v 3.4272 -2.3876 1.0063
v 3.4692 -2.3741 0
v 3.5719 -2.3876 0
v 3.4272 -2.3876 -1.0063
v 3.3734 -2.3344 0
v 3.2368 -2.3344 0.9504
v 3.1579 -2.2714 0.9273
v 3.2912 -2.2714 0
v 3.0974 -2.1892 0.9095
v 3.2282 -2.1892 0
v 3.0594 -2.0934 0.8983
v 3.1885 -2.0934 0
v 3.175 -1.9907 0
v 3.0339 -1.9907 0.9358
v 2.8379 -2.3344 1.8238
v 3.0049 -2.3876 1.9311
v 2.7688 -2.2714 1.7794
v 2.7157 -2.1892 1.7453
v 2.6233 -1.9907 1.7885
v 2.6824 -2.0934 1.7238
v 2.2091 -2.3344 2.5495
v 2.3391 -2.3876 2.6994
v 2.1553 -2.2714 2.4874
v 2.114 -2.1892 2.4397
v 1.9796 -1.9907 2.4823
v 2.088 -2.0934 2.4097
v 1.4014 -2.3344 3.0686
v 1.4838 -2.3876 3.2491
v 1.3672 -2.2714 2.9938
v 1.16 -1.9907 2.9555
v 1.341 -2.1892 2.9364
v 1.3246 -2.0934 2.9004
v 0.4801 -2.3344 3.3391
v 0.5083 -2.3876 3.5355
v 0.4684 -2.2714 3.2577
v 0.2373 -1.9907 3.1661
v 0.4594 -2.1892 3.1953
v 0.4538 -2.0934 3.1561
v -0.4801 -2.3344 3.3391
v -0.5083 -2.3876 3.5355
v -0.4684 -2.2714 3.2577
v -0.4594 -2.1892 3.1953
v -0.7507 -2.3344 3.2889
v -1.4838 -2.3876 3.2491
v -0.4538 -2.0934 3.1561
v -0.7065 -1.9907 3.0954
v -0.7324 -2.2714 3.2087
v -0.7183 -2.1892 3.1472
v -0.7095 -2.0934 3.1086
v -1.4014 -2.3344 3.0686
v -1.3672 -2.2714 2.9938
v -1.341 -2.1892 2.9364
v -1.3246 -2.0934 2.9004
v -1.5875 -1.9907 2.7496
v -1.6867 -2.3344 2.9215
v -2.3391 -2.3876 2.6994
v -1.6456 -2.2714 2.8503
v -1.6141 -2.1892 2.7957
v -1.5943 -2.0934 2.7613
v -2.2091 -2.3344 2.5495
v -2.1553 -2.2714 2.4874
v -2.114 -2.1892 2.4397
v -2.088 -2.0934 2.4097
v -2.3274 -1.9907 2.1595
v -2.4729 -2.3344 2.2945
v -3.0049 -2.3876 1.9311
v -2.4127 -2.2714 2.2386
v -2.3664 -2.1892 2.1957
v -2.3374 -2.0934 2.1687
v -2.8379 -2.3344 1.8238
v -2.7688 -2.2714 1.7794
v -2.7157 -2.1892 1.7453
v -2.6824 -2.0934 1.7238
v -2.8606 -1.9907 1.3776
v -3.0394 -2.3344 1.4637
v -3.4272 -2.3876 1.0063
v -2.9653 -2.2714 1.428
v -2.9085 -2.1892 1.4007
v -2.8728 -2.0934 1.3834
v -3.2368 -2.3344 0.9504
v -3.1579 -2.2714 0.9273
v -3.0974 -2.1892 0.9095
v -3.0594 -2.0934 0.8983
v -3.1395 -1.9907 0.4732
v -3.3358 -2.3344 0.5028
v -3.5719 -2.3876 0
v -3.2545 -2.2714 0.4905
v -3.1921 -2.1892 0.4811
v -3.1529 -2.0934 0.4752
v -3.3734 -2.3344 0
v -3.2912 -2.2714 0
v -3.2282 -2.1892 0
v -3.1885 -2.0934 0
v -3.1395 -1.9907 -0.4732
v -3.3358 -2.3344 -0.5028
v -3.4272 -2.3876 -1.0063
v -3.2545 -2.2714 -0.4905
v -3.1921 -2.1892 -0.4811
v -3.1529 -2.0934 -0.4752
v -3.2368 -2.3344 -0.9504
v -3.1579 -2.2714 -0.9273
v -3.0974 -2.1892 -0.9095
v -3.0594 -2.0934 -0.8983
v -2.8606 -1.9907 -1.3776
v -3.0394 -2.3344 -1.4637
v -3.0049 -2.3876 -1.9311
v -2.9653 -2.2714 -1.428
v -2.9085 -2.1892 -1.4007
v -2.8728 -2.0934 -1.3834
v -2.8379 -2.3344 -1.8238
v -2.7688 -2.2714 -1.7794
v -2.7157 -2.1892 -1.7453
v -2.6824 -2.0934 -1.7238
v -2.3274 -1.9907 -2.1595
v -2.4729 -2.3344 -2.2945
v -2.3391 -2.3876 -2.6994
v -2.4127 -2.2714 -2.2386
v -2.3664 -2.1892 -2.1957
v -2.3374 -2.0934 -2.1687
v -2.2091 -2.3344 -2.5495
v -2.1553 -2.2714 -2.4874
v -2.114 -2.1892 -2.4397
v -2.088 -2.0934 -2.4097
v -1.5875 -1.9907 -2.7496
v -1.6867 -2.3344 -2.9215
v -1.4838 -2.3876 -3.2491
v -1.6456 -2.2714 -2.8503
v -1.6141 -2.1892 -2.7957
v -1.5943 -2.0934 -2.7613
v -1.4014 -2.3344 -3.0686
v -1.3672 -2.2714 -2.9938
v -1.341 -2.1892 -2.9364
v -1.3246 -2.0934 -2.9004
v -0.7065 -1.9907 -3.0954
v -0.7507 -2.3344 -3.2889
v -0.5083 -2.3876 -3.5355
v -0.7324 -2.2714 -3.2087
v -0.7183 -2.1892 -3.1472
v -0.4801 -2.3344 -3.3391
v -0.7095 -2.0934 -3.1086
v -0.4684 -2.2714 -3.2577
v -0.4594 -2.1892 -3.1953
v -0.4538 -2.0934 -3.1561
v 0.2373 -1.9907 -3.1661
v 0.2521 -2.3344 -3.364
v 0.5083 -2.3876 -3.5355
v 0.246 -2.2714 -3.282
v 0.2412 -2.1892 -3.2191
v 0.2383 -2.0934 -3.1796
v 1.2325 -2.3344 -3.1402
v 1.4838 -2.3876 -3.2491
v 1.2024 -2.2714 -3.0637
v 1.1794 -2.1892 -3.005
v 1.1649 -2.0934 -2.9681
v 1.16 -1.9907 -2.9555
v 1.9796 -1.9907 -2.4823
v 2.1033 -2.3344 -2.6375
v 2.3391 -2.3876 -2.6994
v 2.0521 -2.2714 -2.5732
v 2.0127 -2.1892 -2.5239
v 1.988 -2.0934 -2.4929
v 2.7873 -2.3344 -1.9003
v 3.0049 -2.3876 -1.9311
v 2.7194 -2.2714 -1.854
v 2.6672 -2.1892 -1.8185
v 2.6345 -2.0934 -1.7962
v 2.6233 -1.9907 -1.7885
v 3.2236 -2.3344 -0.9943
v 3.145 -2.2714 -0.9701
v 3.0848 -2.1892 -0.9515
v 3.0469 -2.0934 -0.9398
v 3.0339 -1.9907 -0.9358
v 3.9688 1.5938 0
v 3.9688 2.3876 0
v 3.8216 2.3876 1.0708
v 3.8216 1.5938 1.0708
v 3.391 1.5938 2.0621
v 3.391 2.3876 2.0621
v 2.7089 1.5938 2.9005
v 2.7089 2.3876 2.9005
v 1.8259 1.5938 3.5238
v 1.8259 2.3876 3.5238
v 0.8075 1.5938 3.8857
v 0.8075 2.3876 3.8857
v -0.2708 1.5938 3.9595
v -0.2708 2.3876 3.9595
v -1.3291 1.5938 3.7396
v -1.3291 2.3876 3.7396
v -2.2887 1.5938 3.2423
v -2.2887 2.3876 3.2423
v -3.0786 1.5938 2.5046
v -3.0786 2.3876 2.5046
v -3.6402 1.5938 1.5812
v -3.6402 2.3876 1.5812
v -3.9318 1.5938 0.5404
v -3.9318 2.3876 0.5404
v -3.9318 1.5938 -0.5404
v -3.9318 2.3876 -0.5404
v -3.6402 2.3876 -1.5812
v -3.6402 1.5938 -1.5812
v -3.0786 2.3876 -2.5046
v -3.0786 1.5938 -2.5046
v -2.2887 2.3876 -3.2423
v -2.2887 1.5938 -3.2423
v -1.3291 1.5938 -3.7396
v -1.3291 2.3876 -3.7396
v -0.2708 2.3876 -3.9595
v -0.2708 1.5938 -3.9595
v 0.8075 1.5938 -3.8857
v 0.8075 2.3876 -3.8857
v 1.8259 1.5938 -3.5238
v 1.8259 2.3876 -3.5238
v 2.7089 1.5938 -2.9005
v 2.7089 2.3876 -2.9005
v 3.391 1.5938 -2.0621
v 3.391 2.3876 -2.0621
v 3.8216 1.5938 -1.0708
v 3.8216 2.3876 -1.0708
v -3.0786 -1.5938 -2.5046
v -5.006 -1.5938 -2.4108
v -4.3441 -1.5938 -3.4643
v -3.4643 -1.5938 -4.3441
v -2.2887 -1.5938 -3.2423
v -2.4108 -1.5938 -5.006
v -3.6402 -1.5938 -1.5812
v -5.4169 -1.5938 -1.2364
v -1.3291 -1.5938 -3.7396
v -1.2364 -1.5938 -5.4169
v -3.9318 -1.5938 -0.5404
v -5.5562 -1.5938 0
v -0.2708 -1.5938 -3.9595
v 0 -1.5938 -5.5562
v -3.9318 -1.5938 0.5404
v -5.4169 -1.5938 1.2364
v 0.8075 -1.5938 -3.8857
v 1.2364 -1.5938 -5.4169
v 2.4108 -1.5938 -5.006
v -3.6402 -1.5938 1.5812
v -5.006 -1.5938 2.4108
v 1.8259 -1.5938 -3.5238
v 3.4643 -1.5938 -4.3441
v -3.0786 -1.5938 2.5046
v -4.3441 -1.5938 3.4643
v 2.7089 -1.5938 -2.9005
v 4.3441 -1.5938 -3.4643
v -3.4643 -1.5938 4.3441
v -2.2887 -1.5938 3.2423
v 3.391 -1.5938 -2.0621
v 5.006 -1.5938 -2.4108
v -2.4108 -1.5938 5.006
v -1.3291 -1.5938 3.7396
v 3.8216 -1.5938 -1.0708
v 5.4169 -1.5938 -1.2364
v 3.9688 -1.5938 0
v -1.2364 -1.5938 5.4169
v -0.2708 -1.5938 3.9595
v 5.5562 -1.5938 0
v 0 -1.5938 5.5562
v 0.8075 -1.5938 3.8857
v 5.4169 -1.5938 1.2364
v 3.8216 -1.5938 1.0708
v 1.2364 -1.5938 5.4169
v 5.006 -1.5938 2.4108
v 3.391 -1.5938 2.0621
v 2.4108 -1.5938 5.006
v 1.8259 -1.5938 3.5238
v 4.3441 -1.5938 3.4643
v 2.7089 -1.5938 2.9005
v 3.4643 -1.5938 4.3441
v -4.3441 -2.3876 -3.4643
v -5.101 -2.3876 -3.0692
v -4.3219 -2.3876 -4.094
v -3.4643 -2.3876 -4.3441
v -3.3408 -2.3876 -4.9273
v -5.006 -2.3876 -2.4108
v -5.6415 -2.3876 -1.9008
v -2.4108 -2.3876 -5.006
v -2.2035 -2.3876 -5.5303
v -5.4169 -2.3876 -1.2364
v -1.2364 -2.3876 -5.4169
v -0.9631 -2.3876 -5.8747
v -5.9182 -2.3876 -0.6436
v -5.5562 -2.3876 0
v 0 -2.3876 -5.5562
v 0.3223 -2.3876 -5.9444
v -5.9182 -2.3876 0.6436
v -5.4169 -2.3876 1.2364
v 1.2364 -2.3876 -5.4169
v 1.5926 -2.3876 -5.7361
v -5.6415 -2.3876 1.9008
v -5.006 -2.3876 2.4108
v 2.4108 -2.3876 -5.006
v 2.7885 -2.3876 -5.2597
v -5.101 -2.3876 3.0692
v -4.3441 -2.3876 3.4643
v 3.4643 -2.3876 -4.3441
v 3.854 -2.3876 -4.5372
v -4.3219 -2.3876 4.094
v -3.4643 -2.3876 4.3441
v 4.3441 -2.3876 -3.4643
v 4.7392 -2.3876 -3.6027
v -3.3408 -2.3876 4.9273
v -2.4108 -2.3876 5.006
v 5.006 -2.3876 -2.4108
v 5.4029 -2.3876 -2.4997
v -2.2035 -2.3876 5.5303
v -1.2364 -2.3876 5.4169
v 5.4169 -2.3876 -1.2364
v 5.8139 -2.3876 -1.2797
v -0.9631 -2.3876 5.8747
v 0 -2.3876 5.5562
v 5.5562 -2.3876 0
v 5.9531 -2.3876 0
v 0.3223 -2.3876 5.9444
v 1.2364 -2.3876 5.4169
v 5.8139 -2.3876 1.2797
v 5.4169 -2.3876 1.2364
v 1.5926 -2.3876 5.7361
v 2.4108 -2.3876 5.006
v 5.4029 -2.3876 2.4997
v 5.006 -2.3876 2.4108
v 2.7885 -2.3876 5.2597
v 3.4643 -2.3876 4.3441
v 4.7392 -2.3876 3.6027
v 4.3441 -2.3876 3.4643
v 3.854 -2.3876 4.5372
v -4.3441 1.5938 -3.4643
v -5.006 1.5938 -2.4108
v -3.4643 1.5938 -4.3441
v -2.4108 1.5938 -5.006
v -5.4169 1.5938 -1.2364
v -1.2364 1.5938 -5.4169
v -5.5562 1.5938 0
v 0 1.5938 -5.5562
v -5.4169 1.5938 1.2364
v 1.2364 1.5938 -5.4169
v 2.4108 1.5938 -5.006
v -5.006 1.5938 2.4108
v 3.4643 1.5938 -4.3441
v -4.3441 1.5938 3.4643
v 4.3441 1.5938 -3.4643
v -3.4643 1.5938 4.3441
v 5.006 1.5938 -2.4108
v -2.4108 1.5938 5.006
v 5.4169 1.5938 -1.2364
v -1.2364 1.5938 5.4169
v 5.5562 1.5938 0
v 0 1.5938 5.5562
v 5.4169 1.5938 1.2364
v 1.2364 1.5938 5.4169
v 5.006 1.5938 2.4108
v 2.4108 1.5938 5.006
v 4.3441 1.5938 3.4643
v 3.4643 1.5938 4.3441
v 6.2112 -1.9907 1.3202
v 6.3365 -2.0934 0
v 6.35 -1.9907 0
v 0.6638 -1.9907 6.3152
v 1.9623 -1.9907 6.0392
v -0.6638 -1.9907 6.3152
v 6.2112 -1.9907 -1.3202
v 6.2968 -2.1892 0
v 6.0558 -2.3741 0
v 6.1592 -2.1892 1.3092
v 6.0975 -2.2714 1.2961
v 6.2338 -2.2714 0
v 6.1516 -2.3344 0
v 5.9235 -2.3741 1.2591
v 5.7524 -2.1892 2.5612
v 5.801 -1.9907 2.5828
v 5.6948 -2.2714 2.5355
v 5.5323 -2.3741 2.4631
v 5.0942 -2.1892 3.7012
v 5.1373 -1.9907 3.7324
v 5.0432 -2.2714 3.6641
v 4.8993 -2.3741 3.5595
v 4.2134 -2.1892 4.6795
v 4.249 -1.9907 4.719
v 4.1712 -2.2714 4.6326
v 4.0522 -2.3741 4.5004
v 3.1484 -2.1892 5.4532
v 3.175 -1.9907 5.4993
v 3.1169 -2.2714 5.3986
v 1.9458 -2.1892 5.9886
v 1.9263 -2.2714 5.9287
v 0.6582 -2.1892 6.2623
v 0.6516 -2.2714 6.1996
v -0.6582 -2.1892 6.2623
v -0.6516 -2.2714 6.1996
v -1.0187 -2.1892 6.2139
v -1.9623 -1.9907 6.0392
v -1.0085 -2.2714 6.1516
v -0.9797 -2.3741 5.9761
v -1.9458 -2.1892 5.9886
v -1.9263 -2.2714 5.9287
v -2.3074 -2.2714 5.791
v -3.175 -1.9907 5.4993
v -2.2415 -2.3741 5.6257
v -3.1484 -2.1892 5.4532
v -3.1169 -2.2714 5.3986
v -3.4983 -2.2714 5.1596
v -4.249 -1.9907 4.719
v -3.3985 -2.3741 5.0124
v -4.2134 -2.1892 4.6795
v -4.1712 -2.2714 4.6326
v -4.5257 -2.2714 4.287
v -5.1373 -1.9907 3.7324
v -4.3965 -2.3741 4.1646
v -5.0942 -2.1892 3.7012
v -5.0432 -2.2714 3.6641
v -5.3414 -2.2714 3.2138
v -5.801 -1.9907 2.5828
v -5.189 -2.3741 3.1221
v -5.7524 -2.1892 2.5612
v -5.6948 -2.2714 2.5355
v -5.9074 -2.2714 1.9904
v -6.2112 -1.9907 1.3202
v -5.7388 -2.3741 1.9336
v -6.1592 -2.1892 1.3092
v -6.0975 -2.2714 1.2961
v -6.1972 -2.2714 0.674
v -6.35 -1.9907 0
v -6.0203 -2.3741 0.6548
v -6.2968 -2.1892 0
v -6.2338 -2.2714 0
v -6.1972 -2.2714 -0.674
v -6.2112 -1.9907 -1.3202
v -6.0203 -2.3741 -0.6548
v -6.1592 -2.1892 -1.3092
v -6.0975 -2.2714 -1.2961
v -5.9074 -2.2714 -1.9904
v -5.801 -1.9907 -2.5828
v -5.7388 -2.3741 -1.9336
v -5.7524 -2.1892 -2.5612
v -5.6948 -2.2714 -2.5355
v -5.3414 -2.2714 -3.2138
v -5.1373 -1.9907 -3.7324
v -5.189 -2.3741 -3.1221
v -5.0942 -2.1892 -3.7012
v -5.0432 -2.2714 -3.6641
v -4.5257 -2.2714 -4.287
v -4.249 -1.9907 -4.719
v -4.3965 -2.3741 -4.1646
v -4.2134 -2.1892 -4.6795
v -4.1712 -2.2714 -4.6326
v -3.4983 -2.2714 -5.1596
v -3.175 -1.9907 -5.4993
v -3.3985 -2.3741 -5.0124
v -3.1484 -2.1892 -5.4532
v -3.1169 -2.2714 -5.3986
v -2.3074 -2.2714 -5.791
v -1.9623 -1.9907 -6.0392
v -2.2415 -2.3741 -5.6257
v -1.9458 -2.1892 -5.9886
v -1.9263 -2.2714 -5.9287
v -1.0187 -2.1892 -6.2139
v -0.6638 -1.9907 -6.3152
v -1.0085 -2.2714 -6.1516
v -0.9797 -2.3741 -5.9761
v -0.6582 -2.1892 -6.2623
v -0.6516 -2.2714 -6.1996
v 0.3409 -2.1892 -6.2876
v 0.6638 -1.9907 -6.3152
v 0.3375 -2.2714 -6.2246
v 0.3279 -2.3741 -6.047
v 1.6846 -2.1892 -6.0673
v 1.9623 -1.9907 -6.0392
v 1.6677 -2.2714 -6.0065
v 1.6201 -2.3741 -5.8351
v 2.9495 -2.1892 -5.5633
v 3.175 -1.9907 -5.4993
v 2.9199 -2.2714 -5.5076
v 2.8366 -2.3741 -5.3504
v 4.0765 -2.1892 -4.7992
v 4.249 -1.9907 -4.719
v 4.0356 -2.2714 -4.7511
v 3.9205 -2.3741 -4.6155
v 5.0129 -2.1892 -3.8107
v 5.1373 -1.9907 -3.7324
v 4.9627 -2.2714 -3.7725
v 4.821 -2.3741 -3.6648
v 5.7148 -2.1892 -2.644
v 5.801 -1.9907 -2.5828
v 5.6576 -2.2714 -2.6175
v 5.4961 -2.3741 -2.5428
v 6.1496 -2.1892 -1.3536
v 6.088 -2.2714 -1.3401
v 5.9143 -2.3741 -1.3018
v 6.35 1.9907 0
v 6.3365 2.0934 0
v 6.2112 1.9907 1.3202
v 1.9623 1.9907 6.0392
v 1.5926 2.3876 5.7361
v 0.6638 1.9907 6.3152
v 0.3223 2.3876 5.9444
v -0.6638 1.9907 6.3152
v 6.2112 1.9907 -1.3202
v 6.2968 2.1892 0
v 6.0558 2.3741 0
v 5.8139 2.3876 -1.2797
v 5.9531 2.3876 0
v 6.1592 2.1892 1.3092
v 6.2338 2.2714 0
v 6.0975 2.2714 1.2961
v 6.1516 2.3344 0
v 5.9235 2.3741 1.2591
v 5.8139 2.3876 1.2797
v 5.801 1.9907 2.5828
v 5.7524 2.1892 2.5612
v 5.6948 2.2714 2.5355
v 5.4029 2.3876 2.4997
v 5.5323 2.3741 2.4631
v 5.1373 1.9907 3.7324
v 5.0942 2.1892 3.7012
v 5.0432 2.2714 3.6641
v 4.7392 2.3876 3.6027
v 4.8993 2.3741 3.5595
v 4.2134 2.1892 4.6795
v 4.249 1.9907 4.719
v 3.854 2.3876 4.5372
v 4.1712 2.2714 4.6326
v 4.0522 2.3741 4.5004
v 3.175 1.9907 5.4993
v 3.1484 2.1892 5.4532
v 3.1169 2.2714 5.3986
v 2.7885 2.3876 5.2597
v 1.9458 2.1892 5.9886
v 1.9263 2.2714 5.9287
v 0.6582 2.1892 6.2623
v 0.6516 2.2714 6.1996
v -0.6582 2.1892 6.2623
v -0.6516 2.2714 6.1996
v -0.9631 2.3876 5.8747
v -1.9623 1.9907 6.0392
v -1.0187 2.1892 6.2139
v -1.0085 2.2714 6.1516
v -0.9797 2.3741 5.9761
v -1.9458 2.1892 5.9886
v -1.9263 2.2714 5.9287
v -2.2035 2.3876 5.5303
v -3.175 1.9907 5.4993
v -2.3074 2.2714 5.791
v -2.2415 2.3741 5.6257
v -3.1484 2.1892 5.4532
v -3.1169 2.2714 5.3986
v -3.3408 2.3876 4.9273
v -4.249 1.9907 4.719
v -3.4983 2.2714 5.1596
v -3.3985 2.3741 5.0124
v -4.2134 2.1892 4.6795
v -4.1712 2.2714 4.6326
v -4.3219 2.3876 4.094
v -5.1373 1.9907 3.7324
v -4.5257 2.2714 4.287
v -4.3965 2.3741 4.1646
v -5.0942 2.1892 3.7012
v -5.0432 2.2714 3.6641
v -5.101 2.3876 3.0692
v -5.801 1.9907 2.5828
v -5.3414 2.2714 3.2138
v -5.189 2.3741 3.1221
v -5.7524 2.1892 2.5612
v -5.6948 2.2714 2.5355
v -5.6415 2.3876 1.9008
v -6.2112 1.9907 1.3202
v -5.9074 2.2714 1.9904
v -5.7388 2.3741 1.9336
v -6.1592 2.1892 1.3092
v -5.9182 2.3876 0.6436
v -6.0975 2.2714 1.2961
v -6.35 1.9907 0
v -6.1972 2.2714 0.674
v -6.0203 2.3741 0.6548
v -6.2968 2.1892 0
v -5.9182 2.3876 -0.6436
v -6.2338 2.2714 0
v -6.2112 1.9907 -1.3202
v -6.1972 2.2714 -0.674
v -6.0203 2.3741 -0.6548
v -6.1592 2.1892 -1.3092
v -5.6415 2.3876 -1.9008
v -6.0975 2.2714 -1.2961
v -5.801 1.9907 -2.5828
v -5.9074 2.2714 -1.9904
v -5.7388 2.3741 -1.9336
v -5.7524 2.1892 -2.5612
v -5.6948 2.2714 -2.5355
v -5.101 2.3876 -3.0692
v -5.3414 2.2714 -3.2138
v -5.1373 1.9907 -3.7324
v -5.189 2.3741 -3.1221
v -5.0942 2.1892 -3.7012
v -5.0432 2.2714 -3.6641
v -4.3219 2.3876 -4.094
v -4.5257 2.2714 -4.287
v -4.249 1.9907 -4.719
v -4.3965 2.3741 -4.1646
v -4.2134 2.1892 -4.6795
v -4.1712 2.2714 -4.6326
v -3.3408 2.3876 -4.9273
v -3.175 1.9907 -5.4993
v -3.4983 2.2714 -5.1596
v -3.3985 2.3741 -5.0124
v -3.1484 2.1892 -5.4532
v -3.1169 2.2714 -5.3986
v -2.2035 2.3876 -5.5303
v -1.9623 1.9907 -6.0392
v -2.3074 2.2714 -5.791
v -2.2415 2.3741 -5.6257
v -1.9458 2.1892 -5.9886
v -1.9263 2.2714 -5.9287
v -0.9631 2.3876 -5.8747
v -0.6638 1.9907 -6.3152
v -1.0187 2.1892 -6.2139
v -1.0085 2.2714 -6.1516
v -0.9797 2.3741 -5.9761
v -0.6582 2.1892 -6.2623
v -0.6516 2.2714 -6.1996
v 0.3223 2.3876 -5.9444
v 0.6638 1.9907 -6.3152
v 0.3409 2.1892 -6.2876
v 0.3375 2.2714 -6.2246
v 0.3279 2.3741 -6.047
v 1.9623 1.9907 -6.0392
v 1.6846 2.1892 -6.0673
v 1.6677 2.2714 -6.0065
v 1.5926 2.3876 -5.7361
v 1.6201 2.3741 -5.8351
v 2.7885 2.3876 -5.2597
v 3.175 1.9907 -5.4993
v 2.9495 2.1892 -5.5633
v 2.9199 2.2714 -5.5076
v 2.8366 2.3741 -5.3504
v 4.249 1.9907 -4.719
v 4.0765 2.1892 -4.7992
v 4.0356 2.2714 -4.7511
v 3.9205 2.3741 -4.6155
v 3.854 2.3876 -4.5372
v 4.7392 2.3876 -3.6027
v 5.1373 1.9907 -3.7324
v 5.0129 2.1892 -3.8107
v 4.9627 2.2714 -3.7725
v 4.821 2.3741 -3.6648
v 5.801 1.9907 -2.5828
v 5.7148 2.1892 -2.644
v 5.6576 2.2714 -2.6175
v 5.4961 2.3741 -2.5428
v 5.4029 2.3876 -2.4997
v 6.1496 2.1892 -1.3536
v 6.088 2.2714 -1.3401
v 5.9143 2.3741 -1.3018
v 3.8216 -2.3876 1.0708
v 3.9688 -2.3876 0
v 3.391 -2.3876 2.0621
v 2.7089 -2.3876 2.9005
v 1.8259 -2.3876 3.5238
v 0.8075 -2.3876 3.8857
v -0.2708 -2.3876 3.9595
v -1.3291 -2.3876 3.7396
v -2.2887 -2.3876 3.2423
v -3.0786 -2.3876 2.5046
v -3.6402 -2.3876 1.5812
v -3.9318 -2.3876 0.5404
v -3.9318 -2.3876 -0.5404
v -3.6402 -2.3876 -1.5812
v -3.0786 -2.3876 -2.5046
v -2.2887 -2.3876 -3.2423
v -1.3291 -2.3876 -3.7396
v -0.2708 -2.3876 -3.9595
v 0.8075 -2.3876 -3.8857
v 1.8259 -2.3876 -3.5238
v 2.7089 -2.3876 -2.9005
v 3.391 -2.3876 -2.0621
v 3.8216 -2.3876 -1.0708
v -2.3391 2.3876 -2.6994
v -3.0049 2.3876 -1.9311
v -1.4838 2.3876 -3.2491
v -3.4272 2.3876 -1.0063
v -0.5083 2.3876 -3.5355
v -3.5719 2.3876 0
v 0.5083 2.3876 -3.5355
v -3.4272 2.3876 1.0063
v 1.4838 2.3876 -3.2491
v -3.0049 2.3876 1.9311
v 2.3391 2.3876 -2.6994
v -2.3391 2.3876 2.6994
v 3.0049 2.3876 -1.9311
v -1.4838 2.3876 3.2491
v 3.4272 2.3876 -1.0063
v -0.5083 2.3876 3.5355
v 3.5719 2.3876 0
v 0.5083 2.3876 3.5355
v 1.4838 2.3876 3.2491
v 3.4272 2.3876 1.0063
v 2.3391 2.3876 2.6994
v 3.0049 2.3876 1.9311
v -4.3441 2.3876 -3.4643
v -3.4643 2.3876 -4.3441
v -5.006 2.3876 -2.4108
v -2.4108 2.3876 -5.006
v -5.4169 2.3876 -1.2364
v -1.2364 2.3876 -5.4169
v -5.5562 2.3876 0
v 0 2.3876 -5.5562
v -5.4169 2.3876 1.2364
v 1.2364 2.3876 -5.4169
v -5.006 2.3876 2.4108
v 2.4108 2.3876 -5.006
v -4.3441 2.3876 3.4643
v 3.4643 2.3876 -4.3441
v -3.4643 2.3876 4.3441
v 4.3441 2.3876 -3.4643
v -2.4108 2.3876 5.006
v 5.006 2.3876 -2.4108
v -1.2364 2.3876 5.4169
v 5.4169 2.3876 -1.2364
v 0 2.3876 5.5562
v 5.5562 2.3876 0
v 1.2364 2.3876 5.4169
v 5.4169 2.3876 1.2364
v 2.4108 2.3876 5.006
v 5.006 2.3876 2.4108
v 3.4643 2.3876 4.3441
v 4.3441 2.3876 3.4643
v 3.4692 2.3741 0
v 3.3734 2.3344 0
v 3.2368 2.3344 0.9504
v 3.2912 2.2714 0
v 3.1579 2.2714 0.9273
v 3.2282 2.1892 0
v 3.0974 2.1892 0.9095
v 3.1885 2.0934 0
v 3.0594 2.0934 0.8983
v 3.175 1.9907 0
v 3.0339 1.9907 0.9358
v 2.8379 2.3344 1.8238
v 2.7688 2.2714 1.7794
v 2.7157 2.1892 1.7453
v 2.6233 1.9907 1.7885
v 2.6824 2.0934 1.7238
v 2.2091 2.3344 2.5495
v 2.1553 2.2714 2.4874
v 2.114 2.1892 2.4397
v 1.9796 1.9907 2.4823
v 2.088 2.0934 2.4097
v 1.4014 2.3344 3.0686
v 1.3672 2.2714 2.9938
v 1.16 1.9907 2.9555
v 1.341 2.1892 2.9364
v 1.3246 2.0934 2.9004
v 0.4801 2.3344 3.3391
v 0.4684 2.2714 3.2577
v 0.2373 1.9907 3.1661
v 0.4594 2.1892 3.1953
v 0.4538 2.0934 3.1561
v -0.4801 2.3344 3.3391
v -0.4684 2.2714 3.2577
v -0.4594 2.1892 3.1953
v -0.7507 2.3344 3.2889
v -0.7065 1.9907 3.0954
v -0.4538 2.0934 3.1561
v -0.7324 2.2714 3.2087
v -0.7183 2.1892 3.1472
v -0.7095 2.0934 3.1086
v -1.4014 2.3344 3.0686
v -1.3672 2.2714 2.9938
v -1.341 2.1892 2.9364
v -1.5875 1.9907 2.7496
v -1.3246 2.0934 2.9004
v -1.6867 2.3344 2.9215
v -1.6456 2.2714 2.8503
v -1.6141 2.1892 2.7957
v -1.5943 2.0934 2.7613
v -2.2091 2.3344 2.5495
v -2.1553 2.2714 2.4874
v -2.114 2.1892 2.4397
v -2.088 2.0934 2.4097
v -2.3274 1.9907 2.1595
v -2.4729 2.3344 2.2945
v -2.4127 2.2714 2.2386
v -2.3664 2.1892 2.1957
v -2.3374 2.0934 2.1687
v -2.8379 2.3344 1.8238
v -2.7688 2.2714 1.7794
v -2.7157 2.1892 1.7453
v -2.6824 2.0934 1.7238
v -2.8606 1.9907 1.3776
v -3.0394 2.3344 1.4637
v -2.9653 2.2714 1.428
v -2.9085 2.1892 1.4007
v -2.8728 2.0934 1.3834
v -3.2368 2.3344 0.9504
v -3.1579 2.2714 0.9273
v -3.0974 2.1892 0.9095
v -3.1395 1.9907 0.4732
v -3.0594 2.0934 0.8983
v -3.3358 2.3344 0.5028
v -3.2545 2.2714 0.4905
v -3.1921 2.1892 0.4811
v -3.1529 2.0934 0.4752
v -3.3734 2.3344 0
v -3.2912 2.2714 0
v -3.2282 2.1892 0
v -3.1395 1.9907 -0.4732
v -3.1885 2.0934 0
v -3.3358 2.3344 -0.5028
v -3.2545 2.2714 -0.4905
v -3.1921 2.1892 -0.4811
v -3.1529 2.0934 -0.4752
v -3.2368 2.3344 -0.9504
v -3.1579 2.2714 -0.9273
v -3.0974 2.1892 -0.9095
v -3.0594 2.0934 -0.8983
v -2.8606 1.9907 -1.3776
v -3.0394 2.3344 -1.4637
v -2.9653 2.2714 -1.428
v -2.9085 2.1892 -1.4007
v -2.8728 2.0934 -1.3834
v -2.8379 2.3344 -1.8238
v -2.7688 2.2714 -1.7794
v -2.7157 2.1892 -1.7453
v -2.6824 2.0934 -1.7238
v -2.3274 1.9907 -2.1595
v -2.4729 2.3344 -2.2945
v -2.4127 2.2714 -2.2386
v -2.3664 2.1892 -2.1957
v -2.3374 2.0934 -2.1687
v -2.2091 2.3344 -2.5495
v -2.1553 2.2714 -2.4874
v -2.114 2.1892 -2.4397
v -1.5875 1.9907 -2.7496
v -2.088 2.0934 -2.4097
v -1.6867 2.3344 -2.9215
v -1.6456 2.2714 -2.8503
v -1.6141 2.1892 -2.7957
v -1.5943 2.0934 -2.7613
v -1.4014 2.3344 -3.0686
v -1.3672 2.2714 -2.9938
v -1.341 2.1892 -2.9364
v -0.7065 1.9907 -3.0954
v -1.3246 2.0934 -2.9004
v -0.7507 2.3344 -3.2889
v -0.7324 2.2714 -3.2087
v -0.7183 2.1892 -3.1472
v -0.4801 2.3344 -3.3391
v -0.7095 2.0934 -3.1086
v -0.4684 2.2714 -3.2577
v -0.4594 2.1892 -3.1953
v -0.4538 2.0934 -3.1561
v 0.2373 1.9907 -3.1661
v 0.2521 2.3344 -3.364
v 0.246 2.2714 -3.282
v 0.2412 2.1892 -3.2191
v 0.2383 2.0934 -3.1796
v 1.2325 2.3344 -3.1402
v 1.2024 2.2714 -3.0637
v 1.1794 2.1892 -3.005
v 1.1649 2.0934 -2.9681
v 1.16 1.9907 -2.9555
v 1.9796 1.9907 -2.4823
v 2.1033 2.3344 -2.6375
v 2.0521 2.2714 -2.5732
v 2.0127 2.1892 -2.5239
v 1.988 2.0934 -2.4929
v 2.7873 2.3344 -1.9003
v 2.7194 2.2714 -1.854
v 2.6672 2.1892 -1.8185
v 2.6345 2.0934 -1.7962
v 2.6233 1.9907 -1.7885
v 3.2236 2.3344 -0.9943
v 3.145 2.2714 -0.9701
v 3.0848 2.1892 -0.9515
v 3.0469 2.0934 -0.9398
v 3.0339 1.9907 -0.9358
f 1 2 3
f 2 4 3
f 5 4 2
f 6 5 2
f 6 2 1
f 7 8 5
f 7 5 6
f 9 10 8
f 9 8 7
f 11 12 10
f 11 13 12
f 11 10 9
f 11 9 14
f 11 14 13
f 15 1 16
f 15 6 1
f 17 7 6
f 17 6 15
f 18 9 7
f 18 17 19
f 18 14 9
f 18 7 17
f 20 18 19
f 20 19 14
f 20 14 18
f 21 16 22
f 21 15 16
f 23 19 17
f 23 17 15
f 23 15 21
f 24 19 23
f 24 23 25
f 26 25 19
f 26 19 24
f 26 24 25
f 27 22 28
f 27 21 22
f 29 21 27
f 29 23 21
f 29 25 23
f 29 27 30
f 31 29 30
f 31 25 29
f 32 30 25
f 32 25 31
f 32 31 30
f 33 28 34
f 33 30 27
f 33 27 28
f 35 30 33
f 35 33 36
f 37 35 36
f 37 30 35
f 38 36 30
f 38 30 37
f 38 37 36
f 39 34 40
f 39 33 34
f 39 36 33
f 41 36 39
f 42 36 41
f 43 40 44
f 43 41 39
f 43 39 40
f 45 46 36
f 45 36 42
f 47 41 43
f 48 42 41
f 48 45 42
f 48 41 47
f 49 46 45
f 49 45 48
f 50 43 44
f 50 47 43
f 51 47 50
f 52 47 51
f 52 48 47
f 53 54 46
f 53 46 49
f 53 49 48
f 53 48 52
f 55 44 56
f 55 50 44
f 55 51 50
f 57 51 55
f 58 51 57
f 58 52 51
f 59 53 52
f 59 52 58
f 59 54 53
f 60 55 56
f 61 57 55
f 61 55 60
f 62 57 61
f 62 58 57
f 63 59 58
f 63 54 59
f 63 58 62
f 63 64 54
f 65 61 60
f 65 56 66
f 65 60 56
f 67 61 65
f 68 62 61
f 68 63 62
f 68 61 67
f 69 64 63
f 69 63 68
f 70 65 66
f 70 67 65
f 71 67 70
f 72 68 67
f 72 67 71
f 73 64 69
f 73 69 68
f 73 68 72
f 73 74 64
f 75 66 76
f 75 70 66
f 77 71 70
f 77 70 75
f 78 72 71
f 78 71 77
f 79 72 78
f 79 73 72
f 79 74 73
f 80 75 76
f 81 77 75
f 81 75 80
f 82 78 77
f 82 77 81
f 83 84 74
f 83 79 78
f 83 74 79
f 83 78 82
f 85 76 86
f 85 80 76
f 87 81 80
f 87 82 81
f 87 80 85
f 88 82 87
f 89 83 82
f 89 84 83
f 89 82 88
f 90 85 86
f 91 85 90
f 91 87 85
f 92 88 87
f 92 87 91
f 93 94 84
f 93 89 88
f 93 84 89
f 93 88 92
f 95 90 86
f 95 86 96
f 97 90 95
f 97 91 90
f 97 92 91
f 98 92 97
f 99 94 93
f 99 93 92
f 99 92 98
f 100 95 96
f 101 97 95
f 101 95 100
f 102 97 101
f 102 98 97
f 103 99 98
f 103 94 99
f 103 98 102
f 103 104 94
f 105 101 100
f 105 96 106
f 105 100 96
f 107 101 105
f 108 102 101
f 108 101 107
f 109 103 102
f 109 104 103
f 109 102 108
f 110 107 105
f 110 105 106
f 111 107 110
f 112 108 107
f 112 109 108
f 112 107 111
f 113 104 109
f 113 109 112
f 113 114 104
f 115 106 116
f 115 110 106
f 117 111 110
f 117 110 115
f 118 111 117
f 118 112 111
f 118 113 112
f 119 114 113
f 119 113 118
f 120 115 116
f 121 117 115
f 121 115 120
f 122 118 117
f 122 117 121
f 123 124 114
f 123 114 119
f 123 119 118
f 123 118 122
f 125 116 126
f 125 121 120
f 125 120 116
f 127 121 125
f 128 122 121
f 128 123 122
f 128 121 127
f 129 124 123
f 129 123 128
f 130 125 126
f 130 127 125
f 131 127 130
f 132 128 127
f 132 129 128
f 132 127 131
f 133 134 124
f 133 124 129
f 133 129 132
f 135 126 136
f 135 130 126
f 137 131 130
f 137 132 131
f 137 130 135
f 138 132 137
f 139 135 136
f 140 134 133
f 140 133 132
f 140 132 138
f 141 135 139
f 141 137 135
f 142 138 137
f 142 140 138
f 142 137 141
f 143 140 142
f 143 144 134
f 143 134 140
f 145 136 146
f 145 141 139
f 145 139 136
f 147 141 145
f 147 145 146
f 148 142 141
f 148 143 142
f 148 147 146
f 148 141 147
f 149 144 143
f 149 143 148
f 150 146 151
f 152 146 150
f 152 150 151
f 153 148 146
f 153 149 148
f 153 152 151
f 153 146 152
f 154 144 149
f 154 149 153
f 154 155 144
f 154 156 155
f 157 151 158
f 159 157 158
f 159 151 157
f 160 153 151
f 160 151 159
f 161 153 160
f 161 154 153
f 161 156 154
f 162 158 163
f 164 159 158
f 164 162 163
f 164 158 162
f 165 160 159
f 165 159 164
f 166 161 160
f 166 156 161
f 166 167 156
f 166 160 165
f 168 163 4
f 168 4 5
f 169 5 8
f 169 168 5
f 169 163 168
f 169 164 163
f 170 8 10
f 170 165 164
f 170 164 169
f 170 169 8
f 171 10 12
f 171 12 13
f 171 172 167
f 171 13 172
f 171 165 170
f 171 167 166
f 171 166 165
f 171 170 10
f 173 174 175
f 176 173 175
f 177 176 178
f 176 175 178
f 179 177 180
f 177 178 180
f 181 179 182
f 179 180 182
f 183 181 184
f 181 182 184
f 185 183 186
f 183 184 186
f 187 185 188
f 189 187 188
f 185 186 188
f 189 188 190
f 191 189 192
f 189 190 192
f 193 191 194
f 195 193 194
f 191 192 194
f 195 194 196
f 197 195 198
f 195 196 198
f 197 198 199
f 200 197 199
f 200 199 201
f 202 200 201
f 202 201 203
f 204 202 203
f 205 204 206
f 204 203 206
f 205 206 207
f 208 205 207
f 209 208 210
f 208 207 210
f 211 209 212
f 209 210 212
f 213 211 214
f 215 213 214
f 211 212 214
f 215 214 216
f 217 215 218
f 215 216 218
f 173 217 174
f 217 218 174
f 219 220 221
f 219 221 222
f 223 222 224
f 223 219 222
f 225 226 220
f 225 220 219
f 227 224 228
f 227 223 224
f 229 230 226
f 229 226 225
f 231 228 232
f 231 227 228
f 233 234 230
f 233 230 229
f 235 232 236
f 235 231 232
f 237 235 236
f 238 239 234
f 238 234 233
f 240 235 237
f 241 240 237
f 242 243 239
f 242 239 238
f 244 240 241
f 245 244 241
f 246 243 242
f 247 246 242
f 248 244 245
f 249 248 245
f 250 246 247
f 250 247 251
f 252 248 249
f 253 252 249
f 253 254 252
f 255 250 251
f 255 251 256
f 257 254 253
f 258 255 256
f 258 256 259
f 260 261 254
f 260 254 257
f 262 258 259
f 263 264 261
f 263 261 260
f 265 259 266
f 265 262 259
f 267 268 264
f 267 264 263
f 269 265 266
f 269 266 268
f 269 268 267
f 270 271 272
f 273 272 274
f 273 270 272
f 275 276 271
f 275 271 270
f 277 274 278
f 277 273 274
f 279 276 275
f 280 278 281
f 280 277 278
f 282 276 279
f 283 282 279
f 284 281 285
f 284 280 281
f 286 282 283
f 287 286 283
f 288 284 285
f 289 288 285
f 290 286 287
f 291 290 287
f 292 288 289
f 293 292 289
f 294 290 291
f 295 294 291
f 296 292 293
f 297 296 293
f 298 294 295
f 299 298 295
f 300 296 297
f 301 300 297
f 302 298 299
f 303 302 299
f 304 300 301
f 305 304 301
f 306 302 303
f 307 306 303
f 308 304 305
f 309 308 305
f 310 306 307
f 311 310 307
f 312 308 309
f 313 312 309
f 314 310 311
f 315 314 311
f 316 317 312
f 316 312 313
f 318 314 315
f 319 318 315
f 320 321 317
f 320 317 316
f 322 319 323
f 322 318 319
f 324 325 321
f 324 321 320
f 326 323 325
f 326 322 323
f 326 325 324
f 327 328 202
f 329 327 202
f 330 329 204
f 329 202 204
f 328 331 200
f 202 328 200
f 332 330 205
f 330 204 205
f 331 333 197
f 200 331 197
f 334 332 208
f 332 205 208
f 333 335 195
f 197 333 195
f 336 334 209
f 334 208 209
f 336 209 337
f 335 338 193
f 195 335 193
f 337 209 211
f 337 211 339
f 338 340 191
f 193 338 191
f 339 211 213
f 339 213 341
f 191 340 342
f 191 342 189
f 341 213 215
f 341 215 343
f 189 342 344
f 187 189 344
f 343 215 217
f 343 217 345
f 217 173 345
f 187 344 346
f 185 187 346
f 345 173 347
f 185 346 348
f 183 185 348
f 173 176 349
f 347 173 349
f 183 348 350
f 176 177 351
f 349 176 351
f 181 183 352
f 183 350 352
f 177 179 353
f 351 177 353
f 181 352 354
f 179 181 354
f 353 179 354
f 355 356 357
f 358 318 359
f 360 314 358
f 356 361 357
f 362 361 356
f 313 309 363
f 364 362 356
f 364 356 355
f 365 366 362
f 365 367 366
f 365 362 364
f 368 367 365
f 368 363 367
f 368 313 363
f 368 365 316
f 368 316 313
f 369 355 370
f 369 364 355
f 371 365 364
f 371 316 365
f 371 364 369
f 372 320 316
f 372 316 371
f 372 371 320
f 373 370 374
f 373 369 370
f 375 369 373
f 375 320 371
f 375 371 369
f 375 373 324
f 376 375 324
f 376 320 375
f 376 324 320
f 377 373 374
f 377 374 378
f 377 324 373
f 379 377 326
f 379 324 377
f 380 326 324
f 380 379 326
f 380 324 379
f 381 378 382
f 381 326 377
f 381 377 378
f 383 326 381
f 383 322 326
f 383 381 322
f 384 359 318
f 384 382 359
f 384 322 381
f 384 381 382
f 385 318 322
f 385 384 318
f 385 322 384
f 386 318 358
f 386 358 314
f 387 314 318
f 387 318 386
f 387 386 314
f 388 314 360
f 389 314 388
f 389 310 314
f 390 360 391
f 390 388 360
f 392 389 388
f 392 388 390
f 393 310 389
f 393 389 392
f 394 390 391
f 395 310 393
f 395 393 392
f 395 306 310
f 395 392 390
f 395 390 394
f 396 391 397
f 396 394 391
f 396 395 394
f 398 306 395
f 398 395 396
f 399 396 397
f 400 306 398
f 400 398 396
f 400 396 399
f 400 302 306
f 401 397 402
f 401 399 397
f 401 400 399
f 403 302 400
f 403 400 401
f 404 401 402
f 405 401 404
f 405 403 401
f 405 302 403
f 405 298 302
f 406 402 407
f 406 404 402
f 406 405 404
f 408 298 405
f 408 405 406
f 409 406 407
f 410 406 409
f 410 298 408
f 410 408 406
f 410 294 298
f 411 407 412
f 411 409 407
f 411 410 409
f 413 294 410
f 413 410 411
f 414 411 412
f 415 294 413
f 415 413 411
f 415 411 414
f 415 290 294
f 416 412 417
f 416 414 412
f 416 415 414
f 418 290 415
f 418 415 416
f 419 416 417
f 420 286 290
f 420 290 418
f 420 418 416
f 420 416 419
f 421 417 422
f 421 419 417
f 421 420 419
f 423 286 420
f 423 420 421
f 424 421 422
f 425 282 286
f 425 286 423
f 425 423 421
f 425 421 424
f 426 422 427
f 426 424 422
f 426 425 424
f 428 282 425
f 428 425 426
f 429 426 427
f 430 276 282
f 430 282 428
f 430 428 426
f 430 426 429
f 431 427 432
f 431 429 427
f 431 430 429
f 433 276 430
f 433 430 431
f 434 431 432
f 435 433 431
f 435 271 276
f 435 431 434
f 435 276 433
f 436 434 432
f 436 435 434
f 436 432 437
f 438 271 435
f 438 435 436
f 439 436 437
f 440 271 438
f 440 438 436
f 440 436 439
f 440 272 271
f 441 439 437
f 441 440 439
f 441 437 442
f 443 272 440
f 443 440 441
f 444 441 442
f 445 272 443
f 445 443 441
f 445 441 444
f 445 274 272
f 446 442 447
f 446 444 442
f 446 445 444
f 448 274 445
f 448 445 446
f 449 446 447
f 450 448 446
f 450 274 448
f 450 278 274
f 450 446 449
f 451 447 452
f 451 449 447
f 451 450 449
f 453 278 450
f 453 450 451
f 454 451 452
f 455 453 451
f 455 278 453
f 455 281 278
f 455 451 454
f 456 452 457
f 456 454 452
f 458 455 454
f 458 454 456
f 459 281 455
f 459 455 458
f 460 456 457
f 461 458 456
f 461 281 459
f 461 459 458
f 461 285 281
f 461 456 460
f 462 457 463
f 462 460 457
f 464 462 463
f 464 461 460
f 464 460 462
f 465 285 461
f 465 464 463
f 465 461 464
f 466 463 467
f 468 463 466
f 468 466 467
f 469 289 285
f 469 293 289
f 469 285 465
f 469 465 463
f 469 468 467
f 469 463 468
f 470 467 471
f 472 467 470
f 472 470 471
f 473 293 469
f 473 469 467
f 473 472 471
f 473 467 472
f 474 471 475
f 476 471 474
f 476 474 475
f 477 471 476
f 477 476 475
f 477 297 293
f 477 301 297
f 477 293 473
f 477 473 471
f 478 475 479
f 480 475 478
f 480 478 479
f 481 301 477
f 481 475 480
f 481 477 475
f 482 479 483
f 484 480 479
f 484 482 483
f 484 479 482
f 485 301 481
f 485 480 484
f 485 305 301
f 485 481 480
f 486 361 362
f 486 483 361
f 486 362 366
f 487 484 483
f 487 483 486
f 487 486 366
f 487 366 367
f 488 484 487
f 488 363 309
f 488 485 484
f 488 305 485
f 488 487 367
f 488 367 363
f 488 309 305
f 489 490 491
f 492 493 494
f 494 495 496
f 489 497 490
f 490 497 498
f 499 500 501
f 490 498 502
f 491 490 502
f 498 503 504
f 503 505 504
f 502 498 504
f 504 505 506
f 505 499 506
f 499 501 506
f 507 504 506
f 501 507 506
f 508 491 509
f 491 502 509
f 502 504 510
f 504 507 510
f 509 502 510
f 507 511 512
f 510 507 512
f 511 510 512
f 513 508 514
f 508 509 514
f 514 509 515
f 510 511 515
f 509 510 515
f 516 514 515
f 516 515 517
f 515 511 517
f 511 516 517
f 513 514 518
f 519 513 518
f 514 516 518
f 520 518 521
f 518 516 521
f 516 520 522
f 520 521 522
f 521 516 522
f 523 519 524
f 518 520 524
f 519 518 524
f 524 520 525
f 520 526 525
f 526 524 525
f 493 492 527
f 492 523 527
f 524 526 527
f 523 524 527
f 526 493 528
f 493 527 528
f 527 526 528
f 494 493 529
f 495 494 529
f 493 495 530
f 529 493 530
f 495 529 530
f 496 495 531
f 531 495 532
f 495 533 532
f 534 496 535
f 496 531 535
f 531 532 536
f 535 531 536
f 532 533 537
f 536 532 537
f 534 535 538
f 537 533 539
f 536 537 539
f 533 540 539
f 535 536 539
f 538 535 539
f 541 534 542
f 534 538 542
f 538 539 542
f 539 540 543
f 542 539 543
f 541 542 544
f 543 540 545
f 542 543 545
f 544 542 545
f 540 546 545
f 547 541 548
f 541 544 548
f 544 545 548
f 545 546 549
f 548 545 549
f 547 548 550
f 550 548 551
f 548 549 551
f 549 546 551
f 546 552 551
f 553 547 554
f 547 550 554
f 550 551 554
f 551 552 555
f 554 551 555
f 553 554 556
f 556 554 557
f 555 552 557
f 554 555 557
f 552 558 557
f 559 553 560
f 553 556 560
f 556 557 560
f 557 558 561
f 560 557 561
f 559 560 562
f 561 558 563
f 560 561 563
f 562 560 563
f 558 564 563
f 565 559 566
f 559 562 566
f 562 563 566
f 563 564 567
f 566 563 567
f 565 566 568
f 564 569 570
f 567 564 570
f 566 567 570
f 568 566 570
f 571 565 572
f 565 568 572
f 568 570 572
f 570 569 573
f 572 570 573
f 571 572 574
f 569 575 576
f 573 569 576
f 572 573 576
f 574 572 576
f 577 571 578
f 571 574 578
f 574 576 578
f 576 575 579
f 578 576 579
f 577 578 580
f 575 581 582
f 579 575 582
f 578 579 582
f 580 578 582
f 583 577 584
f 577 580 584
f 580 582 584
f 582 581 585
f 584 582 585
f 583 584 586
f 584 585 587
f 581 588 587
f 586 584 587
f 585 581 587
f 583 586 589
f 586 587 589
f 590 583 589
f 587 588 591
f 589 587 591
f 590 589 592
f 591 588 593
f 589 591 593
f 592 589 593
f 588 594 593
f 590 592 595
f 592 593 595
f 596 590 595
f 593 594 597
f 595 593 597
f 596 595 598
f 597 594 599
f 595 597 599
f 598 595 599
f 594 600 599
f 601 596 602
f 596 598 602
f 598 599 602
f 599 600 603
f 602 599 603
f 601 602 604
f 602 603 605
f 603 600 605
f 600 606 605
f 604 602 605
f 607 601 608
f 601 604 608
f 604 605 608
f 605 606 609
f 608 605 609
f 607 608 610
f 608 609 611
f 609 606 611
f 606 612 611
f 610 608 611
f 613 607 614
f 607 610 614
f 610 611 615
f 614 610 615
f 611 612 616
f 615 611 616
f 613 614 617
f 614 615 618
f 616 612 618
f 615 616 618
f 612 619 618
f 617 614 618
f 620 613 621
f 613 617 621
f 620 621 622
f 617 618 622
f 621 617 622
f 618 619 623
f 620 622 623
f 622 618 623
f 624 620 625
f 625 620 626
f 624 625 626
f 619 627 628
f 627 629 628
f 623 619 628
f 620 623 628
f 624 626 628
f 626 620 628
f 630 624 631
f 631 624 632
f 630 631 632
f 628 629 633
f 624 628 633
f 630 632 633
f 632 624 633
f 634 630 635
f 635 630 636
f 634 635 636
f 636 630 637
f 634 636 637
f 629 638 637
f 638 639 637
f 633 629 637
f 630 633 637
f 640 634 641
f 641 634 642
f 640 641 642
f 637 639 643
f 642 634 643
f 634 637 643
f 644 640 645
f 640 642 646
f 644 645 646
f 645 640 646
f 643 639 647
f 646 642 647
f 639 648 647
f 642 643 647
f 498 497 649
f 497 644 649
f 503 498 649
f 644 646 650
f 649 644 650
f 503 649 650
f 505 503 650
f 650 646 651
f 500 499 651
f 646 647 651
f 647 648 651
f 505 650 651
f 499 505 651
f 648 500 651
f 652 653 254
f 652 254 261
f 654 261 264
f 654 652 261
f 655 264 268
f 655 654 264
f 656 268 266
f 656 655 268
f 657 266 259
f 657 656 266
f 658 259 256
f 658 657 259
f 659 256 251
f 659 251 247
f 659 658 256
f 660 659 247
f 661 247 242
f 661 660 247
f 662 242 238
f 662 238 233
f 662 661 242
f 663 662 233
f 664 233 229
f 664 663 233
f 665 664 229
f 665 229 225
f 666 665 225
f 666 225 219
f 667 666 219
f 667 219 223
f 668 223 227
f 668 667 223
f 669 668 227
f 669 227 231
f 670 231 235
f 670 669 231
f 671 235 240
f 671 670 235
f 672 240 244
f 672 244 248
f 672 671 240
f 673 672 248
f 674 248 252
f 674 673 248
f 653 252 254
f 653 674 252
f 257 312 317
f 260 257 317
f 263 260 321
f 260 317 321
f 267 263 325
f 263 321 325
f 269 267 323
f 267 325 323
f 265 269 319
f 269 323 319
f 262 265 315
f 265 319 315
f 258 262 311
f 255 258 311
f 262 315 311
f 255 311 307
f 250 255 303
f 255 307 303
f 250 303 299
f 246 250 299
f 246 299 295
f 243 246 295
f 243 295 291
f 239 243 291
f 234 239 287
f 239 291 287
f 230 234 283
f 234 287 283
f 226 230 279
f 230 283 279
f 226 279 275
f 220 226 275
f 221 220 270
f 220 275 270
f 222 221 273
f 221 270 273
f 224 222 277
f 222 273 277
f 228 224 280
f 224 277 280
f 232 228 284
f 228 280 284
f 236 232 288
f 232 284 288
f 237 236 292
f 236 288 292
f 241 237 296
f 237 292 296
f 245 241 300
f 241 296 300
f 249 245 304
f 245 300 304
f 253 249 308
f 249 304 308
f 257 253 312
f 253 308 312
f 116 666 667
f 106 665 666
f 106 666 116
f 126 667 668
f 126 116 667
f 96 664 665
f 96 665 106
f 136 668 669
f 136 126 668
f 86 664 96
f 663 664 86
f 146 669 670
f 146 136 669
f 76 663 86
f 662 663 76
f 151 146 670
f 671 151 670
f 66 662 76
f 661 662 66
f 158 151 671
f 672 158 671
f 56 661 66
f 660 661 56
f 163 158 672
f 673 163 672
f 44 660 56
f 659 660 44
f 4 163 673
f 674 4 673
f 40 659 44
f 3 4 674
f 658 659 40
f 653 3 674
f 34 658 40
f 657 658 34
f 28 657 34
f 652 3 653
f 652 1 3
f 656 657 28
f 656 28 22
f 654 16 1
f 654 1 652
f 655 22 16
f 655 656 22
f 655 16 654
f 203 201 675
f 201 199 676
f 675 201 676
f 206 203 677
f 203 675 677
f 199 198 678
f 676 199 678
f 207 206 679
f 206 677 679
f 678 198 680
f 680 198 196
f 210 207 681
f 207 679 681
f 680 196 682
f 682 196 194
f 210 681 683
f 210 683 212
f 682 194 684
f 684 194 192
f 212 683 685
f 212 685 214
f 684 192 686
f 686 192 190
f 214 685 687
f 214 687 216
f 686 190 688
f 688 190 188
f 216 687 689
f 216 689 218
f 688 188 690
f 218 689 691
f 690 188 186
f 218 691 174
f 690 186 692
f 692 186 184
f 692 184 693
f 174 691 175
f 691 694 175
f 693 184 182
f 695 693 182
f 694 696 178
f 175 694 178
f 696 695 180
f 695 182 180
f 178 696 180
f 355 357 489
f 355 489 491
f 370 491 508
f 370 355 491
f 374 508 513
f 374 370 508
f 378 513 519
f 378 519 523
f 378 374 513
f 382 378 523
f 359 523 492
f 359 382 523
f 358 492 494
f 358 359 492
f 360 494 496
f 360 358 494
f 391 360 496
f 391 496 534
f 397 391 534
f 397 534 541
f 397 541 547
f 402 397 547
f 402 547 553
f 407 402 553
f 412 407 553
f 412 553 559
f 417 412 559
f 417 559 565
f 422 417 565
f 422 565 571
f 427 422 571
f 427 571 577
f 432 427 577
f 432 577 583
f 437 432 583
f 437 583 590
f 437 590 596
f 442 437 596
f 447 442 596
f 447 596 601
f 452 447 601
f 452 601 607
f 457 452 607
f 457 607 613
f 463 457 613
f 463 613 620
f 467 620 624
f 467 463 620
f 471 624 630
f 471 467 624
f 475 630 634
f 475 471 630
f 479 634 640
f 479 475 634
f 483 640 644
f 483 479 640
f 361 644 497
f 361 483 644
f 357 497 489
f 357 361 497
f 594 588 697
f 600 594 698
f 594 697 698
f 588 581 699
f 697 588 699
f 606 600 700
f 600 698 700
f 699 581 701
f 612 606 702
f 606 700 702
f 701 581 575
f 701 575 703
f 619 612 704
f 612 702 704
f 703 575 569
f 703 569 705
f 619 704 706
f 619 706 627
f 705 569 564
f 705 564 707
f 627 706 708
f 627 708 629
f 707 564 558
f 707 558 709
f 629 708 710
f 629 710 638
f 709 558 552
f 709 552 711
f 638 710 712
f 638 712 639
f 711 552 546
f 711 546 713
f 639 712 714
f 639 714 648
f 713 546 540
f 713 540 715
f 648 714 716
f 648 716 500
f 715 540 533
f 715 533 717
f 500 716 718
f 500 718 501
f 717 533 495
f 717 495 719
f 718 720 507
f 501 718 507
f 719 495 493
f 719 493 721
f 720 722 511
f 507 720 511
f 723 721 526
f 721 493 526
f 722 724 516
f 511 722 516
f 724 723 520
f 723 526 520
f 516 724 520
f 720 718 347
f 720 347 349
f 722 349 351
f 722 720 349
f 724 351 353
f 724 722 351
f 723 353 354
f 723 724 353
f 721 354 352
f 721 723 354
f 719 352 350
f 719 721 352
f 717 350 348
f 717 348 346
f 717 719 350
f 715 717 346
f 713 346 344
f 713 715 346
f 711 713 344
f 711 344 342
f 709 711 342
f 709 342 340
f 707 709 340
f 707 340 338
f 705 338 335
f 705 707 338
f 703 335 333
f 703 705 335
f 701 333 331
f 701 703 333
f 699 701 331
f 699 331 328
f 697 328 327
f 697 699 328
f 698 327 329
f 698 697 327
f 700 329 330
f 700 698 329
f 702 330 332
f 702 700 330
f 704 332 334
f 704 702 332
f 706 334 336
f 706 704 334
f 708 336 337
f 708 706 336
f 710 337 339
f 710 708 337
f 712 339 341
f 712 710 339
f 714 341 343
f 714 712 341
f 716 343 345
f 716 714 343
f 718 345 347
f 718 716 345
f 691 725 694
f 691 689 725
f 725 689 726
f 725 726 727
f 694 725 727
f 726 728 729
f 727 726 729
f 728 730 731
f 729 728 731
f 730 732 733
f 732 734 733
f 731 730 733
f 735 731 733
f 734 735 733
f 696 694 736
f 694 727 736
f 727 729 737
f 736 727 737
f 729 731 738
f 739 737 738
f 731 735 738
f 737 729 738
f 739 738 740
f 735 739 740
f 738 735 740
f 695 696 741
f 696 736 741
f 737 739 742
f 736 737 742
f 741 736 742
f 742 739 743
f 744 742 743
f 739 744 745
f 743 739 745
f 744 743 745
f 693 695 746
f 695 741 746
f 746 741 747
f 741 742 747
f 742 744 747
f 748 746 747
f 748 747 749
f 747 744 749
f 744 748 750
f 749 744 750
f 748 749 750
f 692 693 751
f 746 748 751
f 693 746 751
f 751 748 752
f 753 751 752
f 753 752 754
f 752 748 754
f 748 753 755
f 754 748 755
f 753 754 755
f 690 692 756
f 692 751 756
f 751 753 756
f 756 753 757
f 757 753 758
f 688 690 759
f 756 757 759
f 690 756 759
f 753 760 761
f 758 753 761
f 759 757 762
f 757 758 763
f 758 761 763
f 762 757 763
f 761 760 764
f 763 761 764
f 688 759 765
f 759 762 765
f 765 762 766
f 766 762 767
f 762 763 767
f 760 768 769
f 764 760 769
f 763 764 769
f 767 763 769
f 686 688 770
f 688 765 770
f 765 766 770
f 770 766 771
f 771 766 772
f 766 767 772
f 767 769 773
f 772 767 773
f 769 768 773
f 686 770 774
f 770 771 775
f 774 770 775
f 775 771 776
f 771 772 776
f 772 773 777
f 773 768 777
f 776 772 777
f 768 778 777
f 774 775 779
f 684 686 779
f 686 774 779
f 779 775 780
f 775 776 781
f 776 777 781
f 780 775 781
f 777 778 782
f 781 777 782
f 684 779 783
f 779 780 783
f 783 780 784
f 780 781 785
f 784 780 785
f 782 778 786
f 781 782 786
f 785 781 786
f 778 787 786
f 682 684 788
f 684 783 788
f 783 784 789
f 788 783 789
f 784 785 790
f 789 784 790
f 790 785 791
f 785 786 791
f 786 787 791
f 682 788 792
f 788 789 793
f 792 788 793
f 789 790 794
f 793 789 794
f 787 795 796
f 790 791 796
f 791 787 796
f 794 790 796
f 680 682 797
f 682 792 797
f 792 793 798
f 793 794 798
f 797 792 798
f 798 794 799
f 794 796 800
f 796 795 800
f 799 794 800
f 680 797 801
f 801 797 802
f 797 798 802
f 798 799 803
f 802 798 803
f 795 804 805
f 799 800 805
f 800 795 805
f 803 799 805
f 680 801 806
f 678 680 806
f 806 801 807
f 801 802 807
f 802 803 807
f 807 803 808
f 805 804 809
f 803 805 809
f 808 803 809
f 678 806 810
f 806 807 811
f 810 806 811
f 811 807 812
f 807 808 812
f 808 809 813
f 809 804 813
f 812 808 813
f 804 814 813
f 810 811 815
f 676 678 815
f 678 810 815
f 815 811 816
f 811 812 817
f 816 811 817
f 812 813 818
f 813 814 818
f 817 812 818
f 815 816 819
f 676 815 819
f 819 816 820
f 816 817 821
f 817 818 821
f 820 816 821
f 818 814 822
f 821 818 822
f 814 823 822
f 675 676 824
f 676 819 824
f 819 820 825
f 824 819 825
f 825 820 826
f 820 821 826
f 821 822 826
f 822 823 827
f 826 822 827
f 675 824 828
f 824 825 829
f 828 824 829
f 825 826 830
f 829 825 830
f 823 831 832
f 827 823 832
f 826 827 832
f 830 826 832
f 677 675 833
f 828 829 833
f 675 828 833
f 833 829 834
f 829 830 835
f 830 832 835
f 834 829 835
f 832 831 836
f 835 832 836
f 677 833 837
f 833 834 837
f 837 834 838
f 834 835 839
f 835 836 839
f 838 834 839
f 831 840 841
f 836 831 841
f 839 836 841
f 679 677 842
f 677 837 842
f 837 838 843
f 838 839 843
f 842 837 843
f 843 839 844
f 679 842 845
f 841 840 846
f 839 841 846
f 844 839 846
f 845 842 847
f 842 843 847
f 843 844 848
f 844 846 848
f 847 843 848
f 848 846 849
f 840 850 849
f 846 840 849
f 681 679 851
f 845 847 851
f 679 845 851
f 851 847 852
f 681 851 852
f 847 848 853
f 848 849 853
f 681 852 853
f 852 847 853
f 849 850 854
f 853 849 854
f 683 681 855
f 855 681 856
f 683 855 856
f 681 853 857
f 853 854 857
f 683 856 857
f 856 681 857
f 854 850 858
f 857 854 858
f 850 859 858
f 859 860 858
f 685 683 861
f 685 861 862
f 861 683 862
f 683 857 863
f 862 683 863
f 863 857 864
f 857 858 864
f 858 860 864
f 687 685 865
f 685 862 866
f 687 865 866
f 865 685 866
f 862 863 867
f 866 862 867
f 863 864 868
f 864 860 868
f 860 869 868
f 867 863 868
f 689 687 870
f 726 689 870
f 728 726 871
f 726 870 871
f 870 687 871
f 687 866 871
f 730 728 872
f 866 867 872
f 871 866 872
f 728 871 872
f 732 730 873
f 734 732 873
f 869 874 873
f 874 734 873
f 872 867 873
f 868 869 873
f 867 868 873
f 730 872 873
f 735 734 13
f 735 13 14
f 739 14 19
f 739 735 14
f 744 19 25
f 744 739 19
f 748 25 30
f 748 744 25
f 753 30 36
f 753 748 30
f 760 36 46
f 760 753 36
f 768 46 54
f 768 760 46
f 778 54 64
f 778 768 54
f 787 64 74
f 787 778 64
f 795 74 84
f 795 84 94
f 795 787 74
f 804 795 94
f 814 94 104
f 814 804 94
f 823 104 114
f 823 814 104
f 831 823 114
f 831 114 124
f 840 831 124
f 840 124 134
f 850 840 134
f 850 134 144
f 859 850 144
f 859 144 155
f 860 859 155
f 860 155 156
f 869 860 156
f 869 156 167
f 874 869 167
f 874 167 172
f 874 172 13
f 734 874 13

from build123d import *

# Parameters (mm, degrees)
F0_R     = 6.35
F0_R_2   = 3.175
F1_DEPTH = 2.3876
F2_R     = 5.55625
F2_R_2   = 3.96875
F3_DEPTH = 0.79375
F4_R     = 0.396875


# Not quite as in the source:
# - a pattern or mirror of a feature is missing from the dataset's text; its kind, count and spacing are read off the source's solid


with BuildPart() as f1:
    # F0 (on Front) → F1 (new body, symmetric)
    with BuildSketch(Plane.XZ):
        Circle(F0_R)
        Circle(F0_R_2, mode=Mode.SUBTRACT)
    extrude(amount=F1_DEPTH, both=True)

    # F2 (on face) → F3 (cut)
    with BuildSketch(Plane.XZ.offset(2.3876)):
        Circle(F2_R)
        Circle(F2_R_2, mode=Mode.SUBTRACT)
    f3 = extrude(amount=-F3_DEPTH, mode=Mode.SUBTRACT)

    # F3_copies: F3 across plane
    add(f3.mirror(Plane.ZX), mode=Mode.SUBTRACT)

    # F4
    f4_edges = [f1.edges().sort_by_distance(p)[0] for p in [
        (-3.175, -2.3876, 0),
        (3.175, 0, 0),
        (-3.175, 2.3876, 0),
        (-6.35, 2.3876, 0),
        (6.35, 0, 0),
        (-6.35, -2.3876, 0),
    ]]
    fillet(f4_edges, radius=F4_R)


solid = f1.part
